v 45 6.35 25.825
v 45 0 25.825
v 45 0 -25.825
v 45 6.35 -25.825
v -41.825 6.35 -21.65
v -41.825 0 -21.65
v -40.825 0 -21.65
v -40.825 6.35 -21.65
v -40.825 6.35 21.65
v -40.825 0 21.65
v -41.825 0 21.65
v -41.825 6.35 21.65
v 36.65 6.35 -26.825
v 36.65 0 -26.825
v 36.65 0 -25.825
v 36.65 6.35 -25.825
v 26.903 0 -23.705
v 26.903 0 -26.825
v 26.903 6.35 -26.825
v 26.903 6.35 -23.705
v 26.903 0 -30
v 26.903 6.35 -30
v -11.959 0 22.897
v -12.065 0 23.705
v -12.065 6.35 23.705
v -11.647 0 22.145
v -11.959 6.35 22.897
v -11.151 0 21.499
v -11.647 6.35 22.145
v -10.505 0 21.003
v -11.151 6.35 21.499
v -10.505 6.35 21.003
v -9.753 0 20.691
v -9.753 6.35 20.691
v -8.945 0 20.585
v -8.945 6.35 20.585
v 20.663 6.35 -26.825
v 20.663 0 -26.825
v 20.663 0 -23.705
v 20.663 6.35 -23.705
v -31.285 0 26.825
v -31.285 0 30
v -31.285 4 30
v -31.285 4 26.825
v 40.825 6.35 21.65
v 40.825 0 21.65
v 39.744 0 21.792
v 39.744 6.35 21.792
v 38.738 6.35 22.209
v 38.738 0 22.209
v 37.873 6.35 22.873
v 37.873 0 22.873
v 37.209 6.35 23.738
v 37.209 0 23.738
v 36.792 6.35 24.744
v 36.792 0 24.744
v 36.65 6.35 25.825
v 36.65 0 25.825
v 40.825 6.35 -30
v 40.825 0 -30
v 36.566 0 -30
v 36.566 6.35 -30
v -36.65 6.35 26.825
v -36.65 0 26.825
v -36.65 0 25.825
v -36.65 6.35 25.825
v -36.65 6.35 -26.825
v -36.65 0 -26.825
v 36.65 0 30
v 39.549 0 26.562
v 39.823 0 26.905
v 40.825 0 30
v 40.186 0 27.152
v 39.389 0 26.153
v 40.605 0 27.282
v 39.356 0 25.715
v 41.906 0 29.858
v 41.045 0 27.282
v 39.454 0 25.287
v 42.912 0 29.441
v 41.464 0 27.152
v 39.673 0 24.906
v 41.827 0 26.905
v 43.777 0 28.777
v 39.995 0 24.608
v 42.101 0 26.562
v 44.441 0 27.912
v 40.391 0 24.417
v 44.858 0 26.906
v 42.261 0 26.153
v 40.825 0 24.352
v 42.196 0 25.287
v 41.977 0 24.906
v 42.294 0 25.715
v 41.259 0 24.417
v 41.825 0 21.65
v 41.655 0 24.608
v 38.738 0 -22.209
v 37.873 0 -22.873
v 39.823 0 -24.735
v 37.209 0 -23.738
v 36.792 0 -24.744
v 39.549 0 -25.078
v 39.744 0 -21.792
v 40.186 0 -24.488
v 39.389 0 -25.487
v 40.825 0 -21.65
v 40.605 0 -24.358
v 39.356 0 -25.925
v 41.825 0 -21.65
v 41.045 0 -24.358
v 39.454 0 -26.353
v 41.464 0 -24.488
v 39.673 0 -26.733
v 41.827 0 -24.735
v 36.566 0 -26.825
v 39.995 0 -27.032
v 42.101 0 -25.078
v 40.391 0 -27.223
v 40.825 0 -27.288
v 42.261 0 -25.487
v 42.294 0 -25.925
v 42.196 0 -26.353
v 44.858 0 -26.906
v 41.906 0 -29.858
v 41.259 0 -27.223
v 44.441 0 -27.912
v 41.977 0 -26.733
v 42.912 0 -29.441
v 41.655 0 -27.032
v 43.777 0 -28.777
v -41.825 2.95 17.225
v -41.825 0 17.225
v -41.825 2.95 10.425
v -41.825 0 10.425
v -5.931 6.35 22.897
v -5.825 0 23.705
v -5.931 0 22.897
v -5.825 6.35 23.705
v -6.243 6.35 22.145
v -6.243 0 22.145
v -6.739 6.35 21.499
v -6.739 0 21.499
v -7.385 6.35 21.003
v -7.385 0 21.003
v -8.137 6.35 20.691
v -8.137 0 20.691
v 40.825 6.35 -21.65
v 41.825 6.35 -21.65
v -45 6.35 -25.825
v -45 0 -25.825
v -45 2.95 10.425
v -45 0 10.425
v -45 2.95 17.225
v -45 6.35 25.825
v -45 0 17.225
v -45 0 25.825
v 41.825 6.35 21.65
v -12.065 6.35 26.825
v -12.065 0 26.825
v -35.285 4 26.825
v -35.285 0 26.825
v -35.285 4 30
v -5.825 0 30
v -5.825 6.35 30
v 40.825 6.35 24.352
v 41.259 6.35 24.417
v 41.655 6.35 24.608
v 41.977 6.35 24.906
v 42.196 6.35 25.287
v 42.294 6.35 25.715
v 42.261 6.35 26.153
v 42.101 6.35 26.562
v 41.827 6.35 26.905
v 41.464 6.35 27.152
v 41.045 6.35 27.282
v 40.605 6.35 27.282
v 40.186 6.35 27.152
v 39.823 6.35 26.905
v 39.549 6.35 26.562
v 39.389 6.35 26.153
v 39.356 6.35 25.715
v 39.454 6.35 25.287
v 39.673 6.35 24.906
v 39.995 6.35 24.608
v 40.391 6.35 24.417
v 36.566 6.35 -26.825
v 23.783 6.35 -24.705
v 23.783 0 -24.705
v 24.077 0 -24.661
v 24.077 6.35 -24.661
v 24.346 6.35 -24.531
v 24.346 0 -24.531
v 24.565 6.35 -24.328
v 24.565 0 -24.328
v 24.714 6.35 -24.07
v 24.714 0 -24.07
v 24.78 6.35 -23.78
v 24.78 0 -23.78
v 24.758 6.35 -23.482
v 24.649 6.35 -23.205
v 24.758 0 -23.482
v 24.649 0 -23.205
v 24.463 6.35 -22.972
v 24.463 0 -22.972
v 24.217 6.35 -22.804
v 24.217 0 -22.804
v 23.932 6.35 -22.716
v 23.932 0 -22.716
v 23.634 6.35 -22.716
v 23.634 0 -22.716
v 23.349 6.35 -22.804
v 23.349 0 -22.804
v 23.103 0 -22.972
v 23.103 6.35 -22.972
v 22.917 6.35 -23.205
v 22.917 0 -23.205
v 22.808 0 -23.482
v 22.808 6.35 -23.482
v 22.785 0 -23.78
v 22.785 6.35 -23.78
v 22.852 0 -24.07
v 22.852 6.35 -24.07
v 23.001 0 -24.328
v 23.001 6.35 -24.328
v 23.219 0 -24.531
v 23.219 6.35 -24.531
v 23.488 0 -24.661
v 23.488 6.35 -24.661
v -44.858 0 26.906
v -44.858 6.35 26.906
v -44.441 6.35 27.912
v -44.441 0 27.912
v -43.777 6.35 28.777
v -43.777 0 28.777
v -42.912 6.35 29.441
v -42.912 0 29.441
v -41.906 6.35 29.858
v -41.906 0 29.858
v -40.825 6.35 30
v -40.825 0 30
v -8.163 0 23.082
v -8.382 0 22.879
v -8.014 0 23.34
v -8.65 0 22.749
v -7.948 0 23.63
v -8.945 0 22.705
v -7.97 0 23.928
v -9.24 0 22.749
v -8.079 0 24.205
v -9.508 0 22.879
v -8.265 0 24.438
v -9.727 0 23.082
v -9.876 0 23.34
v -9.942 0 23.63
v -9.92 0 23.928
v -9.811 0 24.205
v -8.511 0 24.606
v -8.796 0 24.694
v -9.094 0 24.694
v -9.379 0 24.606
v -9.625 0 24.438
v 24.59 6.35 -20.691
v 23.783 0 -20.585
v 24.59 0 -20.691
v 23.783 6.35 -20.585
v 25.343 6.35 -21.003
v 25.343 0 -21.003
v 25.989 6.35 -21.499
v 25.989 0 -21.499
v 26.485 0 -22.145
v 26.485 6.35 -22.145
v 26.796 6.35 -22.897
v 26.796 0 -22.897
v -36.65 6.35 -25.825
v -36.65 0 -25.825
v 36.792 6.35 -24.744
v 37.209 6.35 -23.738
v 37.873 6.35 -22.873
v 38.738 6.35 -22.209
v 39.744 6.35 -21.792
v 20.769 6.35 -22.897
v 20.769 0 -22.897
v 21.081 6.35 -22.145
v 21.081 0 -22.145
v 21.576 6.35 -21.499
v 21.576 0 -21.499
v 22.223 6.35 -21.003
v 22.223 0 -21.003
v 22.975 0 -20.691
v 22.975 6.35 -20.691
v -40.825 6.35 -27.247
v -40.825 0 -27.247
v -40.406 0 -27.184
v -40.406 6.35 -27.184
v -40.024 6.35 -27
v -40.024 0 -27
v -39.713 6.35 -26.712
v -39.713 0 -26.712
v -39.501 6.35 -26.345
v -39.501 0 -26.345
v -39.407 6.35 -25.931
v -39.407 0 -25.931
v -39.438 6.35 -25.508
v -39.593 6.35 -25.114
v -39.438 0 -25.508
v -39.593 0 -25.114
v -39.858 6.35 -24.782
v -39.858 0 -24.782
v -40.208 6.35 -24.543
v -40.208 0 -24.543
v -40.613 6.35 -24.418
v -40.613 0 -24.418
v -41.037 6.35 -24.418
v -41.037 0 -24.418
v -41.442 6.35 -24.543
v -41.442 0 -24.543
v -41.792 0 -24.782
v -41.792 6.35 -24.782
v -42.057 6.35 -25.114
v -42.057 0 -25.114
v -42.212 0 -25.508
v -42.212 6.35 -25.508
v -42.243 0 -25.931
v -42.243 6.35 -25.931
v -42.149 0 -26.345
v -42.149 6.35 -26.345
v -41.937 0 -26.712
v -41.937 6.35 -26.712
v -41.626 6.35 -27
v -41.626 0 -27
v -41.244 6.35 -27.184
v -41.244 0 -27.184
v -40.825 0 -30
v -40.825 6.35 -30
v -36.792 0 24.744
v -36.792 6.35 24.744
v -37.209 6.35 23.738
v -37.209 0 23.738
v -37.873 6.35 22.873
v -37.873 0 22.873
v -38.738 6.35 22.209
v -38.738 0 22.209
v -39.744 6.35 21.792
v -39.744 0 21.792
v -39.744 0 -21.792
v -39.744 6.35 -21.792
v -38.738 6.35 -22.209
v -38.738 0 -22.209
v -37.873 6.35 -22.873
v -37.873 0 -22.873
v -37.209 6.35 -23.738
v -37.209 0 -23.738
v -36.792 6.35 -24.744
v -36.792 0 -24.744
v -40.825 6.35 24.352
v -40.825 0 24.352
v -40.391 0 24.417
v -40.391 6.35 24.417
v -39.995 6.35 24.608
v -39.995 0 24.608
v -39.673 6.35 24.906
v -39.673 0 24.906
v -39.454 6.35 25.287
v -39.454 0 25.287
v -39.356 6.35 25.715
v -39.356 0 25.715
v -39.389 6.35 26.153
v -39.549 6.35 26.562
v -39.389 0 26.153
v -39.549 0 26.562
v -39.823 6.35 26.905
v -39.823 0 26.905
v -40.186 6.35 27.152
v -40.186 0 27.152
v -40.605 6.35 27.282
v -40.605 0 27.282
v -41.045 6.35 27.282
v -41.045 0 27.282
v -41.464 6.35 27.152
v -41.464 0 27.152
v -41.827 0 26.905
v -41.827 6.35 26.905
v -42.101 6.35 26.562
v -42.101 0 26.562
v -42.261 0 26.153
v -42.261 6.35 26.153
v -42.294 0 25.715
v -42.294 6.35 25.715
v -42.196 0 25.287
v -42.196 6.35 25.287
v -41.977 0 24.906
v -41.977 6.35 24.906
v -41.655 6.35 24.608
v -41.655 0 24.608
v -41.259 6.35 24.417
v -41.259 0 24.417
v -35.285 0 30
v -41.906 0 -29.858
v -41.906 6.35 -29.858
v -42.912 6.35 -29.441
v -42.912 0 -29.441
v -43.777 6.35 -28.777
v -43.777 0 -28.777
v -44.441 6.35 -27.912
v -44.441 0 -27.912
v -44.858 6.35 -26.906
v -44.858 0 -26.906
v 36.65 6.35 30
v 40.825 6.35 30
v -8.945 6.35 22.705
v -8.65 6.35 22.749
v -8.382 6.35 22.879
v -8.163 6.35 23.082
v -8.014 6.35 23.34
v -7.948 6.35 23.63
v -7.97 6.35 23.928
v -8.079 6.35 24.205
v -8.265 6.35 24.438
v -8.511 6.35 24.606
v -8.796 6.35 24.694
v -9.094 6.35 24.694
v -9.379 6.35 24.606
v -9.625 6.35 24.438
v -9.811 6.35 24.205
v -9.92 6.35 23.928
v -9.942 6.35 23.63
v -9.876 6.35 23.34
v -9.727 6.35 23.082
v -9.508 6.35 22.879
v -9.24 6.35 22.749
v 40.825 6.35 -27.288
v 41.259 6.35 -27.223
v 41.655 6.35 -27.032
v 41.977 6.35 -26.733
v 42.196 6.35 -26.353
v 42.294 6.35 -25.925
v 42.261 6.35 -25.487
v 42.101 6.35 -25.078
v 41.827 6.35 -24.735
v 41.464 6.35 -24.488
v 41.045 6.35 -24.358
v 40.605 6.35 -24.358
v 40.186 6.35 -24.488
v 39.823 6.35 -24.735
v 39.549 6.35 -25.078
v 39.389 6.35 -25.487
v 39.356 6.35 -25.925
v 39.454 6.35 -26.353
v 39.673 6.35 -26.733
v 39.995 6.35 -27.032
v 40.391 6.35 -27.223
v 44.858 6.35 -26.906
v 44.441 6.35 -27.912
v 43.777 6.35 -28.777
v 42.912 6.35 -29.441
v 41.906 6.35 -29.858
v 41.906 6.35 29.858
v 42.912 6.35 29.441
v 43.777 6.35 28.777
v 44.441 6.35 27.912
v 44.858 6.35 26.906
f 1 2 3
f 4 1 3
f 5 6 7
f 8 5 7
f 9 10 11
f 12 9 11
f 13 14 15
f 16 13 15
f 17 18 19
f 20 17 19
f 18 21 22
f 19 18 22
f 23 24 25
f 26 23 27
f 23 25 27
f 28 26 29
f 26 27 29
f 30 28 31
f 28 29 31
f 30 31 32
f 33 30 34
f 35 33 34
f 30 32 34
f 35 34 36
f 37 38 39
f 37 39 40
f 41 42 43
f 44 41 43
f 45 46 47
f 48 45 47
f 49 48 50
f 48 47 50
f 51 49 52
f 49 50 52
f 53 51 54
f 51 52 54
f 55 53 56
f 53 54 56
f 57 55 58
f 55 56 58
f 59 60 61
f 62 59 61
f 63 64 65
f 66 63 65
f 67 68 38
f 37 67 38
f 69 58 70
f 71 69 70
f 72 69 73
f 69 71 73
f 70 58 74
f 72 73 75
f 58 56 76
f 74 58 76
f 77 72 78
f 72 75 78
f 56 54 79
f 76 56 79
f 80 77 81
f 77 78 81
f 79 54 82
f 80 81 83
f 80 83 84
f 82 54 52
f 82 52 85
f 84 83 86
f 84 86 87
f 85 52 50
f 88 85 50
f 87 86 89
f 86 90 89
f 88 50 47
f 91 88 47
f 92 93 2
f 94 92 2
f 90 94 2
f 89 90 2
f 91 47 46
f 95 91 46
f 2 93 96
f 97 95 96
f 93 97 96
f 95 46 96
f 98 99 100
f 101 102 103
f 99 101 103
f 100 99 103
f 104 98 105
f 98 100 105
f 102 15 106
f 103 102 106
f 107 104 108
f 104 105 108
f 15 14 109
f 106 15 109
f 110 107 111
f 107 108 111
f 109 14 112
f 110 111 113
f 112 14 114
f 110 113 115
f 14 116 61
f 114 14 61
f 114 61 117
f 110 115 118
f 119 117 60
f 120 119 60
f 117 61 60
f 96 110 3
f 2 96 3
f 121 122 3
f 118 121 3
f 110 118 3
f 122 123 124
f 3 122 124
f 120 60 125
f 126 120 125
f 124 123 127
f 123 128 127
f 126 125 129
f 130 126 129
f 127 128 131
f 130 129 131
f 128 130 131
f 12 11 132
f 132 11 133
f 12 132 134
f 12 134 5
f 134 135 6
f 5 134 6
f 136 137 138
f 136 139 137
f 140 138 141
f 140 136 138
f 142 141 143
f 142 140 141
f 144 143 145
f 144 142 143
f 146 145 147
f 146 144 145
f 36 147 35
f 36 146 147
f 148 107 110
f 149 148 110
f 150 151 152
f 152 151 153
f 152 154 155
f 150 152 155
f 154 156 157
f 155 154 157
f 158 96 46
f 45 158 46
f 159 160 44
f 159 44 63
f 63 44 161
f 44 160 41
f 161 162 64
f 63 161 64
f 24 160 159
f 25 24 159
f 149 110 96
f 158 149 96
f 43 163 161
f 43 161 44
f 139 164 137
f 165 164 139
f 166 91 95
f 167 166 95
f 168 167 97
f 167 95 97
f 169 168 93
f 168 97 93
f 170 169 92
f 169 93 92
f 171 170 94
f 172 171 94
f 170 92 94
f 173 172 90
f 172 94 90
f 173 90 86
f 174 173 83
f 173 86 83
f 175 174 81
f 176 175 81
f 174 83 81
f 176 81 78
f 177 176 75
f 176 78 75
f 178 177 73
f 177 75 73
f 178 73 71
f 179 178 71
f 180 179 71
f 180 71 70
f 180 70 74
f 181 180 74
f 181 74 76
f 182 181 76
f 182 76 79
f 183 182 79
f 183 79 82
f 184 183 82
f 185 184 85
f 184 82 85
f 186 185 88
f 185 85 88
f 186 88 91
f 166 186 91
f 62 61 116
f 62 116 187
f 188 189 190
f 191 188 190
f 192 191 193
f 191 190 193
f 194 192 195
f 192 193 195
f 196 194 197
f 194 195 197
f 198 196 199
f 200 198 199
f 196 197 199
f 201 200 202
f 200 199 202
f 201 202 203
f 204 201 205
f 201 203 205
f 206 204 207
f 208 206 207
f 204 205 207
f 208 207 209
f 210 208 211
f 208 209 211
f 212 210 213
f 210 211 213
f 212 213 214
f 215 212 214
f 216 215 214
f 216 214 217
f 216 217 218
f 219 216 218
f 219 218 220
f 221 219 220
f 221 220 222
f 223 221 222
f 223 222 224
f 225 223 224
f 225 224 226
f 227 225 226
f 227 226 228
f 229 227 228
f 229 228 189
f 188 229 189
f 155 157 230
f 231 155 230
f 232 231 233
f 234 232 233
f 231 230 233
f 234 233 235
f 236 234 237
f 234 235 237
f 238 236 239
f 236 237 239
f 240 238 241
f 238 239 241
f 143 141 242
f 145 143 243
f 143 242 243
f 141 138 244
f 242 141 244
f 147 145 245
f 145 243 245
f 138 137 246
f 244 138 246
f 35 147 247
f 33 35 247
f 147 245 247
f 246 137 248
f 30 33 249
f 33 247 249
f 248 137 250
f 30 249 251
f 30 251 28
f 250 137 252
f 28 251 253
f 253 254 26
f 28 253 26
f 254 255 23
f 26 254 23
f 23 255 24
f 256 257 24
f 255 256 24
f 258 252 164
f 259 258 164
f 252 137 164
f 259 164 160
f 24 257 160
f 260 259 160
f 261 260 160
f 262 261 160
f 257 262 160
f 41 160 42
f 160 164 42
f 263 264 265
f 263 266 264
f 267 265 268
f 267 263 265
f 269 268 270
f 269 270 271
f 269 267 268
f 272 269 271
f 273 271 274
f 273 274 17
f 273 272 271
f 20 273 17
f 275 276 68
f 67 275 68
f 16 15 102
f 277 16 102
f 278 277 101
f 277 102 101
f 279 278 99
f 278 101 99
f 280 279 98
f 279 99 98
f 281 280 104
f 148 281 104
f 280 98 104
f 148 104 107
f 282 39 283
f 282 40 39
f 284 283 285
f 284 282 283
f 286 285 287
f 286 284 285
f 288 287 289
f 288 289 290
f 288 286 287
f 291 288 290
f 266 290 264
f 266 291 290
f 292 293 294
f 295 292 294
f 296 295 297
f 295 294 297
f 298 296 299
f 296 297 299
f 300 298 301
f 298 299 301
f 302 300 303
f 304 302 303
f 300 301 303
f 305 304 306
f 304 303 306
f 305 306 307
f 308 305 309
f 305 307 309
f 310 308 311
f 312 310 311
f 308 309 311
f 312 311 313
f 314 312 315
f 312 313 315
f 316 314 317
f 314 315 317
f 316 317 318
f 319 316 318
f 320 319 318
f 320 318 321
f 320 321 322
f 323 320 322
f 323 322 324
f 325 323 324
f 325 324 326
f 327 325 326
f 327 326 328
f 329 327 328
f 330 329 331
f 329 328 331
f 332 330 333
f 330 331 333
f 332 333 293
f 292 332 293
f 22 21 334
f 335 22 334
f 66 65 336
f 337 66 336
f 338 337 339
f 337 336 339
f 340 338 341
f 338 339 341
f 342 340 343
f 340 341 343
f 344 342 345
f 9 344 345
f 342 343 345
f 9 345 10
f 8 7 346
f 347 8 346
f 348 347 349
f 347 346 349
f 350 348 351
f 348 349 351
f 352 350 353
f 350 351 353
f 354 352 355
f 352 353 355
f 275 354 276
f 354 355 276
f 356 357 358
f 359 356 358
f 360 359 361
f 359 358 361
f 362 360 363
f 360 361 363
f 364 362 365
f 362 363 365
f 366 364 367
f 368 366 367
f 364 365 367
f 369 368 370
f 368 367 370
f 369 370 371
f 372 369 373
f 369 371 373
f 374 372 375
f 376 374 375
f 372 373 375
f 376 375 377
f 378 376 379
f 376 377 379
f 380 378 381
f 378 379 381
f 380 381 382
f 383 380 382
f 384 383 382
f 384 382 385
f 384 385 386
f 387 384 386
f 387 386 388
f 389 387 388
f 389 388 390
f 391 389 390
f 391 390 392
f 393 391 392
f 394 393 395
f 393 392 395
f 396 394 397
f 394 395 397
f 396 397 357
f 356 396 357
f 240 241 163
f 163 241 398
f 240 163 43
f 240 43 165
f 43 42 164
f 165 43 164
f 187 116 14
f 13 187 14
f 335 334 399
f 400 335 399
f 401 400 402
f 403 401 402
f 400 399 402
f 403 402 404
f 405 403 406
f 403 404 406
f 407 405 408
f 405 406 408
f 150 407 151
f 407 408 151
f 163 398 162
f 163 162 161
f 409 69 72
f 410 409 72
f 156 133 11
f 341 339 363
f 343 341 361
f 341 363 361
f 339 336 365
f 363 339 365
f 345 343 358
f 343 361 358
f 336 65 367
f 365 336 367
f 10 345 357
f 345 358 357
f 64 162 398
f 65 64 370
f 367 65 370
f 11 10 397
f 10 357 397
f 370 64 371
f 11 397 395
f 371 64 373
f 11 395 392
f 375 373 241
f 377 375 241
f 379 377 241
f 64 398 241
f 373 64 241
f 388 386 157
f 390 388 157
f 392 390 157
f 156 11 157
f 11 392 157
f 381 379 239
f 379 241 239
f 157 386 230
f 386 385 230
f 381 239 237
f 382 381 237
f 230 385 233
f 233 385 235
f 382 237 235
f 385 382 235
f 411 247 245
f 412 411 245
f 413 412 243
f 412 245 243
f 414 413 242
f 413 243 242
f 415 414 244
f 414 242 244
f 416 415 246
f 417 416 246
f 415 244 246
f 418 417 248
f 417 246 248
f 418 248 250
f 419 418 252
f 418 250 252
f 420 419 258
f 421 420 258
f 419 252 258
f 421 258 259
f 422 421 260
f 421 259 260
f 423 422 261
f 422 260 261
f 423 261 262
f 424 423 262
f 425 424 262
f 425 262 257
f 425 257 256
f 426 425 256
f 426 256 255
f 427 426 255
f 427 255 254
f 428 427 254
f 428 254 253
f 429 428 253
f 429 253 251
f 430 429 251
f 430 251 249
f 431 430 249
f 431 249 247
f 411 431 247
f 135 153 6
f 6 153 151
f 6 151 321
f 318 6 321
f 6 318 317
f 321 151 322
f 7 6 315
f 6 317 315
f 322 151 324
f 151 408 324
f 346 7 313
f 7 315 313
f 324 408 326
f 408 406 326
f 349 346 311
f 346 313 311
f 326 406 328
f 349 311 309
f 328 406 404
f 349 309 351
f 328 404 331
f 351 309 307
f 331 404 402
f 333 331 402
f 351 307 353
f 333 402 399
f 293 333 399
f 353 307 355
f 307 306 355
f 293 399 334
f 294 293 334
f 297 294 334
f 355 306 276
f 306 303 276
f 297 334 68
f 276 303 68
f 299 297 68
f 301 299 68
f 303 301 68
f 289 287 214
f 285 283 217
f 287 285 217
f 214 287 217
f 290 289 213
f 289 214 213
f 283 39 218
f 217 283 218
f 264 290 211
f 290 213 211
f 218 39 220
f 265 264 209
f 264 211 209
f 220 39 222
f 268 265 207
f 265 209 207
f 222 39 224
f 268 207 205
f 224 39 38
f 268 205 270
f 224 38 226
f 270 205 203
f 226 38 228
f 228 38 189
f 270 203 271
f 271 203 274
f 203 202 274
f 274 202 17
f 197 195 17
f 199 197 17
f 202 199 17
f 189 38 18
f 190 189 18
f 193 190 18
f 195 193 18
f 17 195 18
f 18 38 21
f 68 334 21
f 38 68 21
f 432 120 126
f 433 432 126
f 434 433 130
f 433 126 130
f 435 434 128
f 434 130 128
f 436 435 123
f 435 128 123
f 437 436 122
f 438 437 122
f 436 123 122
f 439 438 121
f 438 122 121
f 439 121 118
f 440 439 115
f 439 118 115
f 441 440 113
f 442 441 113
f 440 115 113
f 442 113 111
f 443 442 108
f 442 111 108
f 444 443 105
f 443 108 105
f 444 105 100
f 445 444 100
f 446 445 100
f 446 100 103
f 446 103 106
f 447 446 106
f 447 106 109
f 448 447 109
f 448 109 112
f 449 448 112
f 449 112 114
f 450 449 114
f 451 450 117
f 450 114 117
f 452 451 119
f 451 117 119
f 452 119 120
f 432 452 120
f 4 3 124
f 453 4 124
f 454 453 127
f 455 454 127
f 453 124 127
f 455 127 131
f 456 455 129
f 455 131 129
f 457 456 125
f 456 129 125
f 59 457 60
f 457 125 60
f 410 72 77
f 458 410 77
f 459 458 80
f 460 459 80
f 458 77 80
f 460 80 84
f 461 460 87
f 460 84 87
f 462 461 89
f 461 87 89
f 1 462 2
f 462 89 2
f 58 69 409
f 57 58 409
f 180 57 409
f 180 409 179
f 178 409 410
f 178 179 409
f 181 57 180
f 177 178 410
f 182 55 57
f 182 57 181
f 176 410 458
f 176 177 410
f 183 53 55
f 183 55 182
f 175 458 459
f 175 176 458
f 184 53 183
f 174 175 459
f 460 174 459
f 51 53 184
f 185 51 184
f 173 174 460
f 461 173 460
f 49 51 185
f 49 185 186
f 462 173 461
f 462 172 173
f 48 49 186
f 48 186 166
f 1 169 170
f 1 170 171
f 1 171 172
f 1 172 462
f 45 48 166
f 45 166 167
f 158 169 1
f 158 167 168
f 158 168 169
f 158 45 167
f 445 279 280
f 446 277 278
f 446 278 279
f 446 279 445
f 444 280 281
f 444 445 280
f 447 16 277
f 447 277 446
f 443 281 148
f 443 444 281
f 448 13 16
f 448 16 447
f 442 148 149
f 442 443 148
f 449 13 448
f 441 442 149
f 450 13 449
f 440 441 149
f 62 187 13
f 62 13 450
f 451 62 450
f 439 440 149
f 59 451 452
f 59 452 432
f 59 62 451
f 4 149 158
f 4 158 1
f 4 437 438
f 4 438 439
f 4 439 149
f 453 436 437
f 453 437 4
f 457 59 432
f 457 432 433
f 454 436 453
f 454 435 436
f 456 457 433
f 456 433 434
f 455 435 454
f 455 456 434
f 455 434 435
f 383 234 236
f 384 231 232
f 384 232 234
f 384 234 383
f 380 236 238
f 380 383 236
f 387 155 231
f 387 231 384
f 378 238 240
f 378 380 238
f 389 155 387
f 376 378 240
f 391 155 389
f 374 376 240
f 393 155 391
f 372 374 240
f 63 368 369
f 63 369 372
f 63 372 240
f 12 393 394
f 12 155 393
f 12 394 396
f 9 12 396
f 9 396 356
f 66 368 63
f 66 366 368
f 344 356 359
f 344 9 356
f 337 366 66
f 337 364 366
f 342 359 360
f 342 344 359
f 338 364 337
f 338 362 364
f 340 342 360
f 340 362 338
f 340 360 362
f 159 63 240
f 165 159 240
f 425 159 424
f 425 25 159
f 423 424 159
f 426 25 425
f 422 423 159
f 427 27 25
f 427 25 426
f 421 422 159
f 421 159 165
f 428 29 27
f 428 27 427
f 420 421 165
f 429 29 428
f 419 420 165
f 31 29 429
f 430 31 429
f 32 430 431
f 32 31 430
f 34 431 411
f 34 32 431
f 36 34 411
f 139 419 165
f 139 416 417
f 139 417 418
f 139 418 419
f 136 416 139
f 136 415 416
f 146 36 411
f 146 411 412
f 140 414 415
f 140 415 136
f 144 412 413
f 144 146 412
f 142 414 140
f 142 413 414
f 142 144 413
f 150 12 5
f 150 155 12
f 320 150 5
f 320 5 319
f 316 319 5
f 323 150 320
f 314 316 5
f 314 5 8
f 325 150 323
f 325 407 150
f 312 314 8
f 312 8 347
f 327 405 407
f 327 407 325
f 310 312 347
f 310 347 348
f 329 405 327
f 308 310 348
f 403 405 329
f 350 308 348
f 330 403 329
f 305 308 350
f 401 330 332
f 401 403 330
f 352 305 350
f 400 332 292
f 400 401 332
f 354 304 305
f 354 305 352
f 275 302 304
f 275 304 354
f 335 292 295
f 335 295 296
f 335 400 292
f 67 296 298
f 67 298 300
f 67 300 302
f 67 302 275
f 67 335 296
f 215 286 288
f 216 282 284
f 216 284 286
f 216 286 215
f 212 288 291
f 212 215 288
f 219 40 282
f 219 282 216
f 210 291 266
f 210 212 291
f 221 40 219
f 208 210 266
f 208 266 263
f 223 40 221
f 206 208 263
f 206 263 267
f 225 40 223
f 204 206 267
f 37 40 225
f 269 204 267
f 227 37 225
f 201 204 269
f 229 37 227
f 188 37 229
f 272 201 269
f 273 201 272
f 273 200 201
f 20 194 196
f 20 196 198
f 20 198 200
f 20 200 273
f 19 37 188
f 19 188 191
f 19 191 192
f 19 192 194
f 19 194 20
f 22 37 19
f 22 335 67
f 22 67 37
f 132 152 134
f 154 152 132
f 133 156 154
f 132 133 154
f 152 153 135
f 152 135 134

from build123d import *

# Parameters (mm, degrees)
BOSS_EXTRUDE3_DEPTH = 6.35
SKETCH3_W           = 9.663283239
SKETCH3_H           = 6.35
CUT_EXTRUDE1_DEPTH  = 3.175
SKETCH4_W           = 42.475
SKETCH4_H           = 6.35
CUT_EXTRUDE2_DEPTH  = 8.35
SKETCH5_W           = 6.8
SKETCH5_H           = 5.9
CUT_EXTRUDE3_DEPTH  = 3.175
SKETCH6_R           = 1.4732
CUT_EXTRUDE4_DEPTH  = 6.35
SKETCH7_R           = 1.4224
SKETCH7_R_2         = 1.4732
CUT_EXTRUDE5_DEPTH  = 6.35
SKETCH8_W           = 6.24
SKETCH8_H           = 6.35
BOSS_EXTRUDE4_DEPTH = 6.24
SKETCH9_W           = 6.24
SKETCH9_H           = 6.35
BOSS_EXTRUDE5_DEPTH = 6.24
SKETCH10_R          = 1
CUT_EXTRUDE6_DEPTH  = 55.454774814
FILLET1_R           = 3.12
SKETCH11_W          = 4
SKETCH11_H          = 4
CUT_EXTRUDE7_DEPTH  = 10


with BuildPart() as part:
    # Sketch2 → Boss-Extrude3 (new body)
    with BuildSketch(Plane(origin=(0, 0, 0), x_dir=(1, 0, 0), z_dir=(0, 1, 0))):
        with BuildLine():
            Line((-45, 25.825), (-45, -25.825))
            ThreePointArc((-45, -25.825), (-43.777170811, -28.777170811), (-40.825, -30))
            Line((-40.825, -30), (40.825, -30))
            ThreePointArc((40.825, -30), (43.777170811, -28.777170811), (45, -25.825))
            Line((45, -25.825), (45, 25.825))
            ThreePointArc((45, 25.825), (43.777170811, 28.777170811), (40.825, 30))
            Line((40.825, 30), (-40.825, 30))
            ThreePointArc((-40.825, 30), (-43.777170811, 28.777170811), (-45, 25.825))
        make_face()
        with BuildLine():
            Line((40.825, 21.65), (41.825, 21.65))
            Line((41.825, 21.65), (41.825, -21.65))
            Line((41.825, -21.65), (40.825, -21.65))
            ThreePointArc((40.825, -21.65), (37.872829189, -22.872829189), (36.65, -25.825))
            Line((36.65, -25.825), (36.65, -26.825))
            Line((36.65, -26.825), (-36.65, -26.825))
            Line((-36.65, -26.825), (-36.65, -25.825))
            ThreePointArc((-36.65, -25.825), (-37.872829189, -22.872829189), (-40.825, -21.65))
            Line((-40.825, -21.65), (-41.825, -21.65))
            Line((-41.825, -21.65), (-41.825, 21.65))
            Line((-41.825, 21.65), (-40.825, 21.65))
            ThreePointArc((-40.825, 21.65), (-37.872829189, 22.872829189), (-36.65, 25.825))
            Line((-36.65, 25.825), (-36.65, 26.825))
            Line((-36.65, 26.825), (36.65, 26.825))
            Line((36.65, 26.825), (36.65, 25.825))
            ThreePointArc((36.65, 25.825), (37.872829189, 22.872829189), (40.825, 21.65))
        make_face(mode=Mode.SUBTRACT)
    extrude(amount=BOSS_EXTRUDE3_DEPTH)

    # Sketch3 → Cut-Extrude1 (cut)
    with BuildSketch(Plane(origin=(0, 0, -30), x_dir=(-1, 0, 0), z_dir=(0, 0, -1))):
        with Locations((-31.734329903, 3.175)):
            Rectangle(SKETCH3_W, SKETCH3_H)
    extrude(amount=-CUT_EXTRUDE1_DEPTH, mode=Mode.SUBTRACT)

    # Sketch4 → Cut-Extrude2 (cut)
    with BuildSketch(Plane.XY.offset(30)):
        with Locations((15.4125, 3.175)):
            Rectangle(SKETCH4_W, SKETCH4_H)
    extrude(amount=-CUT_EXTRUDE2_DEPTH, mode=Mode.SUBTRACT)


with BuildPart() as cut_extrude2_piece_1:
    # of the separate pieces the step leaves, piece 1, a body of its own (cut_extrude2_pieces)
    add(part.part.solids().sort_by_distance((-40.825, 0, 30))[0])

    # Sketch5 → Cut-Extrude3 (cut)
    with BuildSketch(Plane.ZY.offset(45)):
        with Locations((13.825, 0)):
            Rectangle(SKETCH5_W, SKETCH5_H)
    extrude(amount=-CUT_EXTRUDE3_DEPTH, mode=Mode.SUBTRACT)

    # Sketch7 → Cut-Extrude5 (cut)
    with BuildSketch(Plane.XZ):
        with Locations(Location((-40.825, -25.825, 0), (0, 0, 270))):
            Circle(SKETCH7_R)
        with Locations(Location((-40.825, 25.825, 0), (0, 0, 270))):
            Circle(SKETCH7_R_2)
    extrude(amount=-CUT_EXTRUDE5_DEPTH, mode=Mode.SUBTRACT)

    # Sketch8 → Boss-Extrude4 (add)
    with BuildSketch(Plane(origin=(0, 0, 26.825), x_dir=(-1, 0, 0), z_dir=(0, 0, -1))):
        with Locations((8.945, 3.175)):
            Rectangle(SKETCH8_W, SKETCH8_H)
    extrude(amount=BOSS_EXTRUDE4_DEPTH)

    # Sketch9 → Boss-Extrude5 (add)
    with BuildSketch(Plane.XY.offset(-26.825)):
        with Locations((23.782688283, 3.175)):
            Rectangle(SKETCH9_W, SKETCH9_H)
    extrude(amount=BOSS_EXTRUDE5_DEPTH)

    # Sketch10 → Cut-Extrude6 (cut, through all)
    with BuildSketch(Plane(origin=(0, 0, 0), x_dir=(-1, 0, 0), z_dir=(0, -1, 0))):
        with Locations(Location((-23.782688283, 23.705, 0), (0, 0, 90))):
            Circle(SKETCH10_R)
        with Locations(Location((8.945, -23.705, 0), (0, 0, 90))):
            Circle(SKETCH10_R)
    extrude(amount=-CUT_EXTRUDE6_DEPTH, mode=Mode.SUBTRACT)

    # Fillet1
    fillet1_edges = [cut_extrude2_piece_1.edges().sort_by_distance(p)[0] for p in [
        (-12.065, 3.175, 20.585),
        (-5.825, 3.175, 20.585),
        (26.902688283, 3.175, -20.585),
        (20.662688283, 3.175, -20.585),
    ]]
    fillet(fillet1_edges, radius=FILLET1_R - 0.0001)  # a hair under: the kernel refuses the full size

    # Sketch11 → Cut-Extrude7 (cut)
    with BuildSketch(Plane.XY.offset(30)):
        with Locations((-33.285, 2)):
            Rectangle(SKETCH11_W, SKETCH11_H)
    extrude(amount=-CUT_EXTRUDE7_DEPTH, mode=Mode.SUBTRACT)


with BuildPart() as cut_extrude2_piece_2:
    # of the separate pieces the step leaves, piece 2, a body of its own (cut_extrude2_pieces)
    add(part.part.solids().sort_by_distance((40.825, 0, -30))[0])

    # Sketch6 → Cut-Extrude4 (cut)
    with BuildSketch(Plane.XZ):
        with Locations(Location((40.825, 25.825, 0), (0, 0, 270))):
            Circle(SKETCH6_R)
        with Locations(Location((40.825, -25.81487963, 0), (0, 0, 270))):
            Circle(SKETCH6_R)
    extrude(amount=-CUT_EXTRUDE4_DEPTH, mode=Mode.SUBTRACT)


solid = Compound([cut_extrude2_piece_1.part, cut_extrude2_piece_2.part])
